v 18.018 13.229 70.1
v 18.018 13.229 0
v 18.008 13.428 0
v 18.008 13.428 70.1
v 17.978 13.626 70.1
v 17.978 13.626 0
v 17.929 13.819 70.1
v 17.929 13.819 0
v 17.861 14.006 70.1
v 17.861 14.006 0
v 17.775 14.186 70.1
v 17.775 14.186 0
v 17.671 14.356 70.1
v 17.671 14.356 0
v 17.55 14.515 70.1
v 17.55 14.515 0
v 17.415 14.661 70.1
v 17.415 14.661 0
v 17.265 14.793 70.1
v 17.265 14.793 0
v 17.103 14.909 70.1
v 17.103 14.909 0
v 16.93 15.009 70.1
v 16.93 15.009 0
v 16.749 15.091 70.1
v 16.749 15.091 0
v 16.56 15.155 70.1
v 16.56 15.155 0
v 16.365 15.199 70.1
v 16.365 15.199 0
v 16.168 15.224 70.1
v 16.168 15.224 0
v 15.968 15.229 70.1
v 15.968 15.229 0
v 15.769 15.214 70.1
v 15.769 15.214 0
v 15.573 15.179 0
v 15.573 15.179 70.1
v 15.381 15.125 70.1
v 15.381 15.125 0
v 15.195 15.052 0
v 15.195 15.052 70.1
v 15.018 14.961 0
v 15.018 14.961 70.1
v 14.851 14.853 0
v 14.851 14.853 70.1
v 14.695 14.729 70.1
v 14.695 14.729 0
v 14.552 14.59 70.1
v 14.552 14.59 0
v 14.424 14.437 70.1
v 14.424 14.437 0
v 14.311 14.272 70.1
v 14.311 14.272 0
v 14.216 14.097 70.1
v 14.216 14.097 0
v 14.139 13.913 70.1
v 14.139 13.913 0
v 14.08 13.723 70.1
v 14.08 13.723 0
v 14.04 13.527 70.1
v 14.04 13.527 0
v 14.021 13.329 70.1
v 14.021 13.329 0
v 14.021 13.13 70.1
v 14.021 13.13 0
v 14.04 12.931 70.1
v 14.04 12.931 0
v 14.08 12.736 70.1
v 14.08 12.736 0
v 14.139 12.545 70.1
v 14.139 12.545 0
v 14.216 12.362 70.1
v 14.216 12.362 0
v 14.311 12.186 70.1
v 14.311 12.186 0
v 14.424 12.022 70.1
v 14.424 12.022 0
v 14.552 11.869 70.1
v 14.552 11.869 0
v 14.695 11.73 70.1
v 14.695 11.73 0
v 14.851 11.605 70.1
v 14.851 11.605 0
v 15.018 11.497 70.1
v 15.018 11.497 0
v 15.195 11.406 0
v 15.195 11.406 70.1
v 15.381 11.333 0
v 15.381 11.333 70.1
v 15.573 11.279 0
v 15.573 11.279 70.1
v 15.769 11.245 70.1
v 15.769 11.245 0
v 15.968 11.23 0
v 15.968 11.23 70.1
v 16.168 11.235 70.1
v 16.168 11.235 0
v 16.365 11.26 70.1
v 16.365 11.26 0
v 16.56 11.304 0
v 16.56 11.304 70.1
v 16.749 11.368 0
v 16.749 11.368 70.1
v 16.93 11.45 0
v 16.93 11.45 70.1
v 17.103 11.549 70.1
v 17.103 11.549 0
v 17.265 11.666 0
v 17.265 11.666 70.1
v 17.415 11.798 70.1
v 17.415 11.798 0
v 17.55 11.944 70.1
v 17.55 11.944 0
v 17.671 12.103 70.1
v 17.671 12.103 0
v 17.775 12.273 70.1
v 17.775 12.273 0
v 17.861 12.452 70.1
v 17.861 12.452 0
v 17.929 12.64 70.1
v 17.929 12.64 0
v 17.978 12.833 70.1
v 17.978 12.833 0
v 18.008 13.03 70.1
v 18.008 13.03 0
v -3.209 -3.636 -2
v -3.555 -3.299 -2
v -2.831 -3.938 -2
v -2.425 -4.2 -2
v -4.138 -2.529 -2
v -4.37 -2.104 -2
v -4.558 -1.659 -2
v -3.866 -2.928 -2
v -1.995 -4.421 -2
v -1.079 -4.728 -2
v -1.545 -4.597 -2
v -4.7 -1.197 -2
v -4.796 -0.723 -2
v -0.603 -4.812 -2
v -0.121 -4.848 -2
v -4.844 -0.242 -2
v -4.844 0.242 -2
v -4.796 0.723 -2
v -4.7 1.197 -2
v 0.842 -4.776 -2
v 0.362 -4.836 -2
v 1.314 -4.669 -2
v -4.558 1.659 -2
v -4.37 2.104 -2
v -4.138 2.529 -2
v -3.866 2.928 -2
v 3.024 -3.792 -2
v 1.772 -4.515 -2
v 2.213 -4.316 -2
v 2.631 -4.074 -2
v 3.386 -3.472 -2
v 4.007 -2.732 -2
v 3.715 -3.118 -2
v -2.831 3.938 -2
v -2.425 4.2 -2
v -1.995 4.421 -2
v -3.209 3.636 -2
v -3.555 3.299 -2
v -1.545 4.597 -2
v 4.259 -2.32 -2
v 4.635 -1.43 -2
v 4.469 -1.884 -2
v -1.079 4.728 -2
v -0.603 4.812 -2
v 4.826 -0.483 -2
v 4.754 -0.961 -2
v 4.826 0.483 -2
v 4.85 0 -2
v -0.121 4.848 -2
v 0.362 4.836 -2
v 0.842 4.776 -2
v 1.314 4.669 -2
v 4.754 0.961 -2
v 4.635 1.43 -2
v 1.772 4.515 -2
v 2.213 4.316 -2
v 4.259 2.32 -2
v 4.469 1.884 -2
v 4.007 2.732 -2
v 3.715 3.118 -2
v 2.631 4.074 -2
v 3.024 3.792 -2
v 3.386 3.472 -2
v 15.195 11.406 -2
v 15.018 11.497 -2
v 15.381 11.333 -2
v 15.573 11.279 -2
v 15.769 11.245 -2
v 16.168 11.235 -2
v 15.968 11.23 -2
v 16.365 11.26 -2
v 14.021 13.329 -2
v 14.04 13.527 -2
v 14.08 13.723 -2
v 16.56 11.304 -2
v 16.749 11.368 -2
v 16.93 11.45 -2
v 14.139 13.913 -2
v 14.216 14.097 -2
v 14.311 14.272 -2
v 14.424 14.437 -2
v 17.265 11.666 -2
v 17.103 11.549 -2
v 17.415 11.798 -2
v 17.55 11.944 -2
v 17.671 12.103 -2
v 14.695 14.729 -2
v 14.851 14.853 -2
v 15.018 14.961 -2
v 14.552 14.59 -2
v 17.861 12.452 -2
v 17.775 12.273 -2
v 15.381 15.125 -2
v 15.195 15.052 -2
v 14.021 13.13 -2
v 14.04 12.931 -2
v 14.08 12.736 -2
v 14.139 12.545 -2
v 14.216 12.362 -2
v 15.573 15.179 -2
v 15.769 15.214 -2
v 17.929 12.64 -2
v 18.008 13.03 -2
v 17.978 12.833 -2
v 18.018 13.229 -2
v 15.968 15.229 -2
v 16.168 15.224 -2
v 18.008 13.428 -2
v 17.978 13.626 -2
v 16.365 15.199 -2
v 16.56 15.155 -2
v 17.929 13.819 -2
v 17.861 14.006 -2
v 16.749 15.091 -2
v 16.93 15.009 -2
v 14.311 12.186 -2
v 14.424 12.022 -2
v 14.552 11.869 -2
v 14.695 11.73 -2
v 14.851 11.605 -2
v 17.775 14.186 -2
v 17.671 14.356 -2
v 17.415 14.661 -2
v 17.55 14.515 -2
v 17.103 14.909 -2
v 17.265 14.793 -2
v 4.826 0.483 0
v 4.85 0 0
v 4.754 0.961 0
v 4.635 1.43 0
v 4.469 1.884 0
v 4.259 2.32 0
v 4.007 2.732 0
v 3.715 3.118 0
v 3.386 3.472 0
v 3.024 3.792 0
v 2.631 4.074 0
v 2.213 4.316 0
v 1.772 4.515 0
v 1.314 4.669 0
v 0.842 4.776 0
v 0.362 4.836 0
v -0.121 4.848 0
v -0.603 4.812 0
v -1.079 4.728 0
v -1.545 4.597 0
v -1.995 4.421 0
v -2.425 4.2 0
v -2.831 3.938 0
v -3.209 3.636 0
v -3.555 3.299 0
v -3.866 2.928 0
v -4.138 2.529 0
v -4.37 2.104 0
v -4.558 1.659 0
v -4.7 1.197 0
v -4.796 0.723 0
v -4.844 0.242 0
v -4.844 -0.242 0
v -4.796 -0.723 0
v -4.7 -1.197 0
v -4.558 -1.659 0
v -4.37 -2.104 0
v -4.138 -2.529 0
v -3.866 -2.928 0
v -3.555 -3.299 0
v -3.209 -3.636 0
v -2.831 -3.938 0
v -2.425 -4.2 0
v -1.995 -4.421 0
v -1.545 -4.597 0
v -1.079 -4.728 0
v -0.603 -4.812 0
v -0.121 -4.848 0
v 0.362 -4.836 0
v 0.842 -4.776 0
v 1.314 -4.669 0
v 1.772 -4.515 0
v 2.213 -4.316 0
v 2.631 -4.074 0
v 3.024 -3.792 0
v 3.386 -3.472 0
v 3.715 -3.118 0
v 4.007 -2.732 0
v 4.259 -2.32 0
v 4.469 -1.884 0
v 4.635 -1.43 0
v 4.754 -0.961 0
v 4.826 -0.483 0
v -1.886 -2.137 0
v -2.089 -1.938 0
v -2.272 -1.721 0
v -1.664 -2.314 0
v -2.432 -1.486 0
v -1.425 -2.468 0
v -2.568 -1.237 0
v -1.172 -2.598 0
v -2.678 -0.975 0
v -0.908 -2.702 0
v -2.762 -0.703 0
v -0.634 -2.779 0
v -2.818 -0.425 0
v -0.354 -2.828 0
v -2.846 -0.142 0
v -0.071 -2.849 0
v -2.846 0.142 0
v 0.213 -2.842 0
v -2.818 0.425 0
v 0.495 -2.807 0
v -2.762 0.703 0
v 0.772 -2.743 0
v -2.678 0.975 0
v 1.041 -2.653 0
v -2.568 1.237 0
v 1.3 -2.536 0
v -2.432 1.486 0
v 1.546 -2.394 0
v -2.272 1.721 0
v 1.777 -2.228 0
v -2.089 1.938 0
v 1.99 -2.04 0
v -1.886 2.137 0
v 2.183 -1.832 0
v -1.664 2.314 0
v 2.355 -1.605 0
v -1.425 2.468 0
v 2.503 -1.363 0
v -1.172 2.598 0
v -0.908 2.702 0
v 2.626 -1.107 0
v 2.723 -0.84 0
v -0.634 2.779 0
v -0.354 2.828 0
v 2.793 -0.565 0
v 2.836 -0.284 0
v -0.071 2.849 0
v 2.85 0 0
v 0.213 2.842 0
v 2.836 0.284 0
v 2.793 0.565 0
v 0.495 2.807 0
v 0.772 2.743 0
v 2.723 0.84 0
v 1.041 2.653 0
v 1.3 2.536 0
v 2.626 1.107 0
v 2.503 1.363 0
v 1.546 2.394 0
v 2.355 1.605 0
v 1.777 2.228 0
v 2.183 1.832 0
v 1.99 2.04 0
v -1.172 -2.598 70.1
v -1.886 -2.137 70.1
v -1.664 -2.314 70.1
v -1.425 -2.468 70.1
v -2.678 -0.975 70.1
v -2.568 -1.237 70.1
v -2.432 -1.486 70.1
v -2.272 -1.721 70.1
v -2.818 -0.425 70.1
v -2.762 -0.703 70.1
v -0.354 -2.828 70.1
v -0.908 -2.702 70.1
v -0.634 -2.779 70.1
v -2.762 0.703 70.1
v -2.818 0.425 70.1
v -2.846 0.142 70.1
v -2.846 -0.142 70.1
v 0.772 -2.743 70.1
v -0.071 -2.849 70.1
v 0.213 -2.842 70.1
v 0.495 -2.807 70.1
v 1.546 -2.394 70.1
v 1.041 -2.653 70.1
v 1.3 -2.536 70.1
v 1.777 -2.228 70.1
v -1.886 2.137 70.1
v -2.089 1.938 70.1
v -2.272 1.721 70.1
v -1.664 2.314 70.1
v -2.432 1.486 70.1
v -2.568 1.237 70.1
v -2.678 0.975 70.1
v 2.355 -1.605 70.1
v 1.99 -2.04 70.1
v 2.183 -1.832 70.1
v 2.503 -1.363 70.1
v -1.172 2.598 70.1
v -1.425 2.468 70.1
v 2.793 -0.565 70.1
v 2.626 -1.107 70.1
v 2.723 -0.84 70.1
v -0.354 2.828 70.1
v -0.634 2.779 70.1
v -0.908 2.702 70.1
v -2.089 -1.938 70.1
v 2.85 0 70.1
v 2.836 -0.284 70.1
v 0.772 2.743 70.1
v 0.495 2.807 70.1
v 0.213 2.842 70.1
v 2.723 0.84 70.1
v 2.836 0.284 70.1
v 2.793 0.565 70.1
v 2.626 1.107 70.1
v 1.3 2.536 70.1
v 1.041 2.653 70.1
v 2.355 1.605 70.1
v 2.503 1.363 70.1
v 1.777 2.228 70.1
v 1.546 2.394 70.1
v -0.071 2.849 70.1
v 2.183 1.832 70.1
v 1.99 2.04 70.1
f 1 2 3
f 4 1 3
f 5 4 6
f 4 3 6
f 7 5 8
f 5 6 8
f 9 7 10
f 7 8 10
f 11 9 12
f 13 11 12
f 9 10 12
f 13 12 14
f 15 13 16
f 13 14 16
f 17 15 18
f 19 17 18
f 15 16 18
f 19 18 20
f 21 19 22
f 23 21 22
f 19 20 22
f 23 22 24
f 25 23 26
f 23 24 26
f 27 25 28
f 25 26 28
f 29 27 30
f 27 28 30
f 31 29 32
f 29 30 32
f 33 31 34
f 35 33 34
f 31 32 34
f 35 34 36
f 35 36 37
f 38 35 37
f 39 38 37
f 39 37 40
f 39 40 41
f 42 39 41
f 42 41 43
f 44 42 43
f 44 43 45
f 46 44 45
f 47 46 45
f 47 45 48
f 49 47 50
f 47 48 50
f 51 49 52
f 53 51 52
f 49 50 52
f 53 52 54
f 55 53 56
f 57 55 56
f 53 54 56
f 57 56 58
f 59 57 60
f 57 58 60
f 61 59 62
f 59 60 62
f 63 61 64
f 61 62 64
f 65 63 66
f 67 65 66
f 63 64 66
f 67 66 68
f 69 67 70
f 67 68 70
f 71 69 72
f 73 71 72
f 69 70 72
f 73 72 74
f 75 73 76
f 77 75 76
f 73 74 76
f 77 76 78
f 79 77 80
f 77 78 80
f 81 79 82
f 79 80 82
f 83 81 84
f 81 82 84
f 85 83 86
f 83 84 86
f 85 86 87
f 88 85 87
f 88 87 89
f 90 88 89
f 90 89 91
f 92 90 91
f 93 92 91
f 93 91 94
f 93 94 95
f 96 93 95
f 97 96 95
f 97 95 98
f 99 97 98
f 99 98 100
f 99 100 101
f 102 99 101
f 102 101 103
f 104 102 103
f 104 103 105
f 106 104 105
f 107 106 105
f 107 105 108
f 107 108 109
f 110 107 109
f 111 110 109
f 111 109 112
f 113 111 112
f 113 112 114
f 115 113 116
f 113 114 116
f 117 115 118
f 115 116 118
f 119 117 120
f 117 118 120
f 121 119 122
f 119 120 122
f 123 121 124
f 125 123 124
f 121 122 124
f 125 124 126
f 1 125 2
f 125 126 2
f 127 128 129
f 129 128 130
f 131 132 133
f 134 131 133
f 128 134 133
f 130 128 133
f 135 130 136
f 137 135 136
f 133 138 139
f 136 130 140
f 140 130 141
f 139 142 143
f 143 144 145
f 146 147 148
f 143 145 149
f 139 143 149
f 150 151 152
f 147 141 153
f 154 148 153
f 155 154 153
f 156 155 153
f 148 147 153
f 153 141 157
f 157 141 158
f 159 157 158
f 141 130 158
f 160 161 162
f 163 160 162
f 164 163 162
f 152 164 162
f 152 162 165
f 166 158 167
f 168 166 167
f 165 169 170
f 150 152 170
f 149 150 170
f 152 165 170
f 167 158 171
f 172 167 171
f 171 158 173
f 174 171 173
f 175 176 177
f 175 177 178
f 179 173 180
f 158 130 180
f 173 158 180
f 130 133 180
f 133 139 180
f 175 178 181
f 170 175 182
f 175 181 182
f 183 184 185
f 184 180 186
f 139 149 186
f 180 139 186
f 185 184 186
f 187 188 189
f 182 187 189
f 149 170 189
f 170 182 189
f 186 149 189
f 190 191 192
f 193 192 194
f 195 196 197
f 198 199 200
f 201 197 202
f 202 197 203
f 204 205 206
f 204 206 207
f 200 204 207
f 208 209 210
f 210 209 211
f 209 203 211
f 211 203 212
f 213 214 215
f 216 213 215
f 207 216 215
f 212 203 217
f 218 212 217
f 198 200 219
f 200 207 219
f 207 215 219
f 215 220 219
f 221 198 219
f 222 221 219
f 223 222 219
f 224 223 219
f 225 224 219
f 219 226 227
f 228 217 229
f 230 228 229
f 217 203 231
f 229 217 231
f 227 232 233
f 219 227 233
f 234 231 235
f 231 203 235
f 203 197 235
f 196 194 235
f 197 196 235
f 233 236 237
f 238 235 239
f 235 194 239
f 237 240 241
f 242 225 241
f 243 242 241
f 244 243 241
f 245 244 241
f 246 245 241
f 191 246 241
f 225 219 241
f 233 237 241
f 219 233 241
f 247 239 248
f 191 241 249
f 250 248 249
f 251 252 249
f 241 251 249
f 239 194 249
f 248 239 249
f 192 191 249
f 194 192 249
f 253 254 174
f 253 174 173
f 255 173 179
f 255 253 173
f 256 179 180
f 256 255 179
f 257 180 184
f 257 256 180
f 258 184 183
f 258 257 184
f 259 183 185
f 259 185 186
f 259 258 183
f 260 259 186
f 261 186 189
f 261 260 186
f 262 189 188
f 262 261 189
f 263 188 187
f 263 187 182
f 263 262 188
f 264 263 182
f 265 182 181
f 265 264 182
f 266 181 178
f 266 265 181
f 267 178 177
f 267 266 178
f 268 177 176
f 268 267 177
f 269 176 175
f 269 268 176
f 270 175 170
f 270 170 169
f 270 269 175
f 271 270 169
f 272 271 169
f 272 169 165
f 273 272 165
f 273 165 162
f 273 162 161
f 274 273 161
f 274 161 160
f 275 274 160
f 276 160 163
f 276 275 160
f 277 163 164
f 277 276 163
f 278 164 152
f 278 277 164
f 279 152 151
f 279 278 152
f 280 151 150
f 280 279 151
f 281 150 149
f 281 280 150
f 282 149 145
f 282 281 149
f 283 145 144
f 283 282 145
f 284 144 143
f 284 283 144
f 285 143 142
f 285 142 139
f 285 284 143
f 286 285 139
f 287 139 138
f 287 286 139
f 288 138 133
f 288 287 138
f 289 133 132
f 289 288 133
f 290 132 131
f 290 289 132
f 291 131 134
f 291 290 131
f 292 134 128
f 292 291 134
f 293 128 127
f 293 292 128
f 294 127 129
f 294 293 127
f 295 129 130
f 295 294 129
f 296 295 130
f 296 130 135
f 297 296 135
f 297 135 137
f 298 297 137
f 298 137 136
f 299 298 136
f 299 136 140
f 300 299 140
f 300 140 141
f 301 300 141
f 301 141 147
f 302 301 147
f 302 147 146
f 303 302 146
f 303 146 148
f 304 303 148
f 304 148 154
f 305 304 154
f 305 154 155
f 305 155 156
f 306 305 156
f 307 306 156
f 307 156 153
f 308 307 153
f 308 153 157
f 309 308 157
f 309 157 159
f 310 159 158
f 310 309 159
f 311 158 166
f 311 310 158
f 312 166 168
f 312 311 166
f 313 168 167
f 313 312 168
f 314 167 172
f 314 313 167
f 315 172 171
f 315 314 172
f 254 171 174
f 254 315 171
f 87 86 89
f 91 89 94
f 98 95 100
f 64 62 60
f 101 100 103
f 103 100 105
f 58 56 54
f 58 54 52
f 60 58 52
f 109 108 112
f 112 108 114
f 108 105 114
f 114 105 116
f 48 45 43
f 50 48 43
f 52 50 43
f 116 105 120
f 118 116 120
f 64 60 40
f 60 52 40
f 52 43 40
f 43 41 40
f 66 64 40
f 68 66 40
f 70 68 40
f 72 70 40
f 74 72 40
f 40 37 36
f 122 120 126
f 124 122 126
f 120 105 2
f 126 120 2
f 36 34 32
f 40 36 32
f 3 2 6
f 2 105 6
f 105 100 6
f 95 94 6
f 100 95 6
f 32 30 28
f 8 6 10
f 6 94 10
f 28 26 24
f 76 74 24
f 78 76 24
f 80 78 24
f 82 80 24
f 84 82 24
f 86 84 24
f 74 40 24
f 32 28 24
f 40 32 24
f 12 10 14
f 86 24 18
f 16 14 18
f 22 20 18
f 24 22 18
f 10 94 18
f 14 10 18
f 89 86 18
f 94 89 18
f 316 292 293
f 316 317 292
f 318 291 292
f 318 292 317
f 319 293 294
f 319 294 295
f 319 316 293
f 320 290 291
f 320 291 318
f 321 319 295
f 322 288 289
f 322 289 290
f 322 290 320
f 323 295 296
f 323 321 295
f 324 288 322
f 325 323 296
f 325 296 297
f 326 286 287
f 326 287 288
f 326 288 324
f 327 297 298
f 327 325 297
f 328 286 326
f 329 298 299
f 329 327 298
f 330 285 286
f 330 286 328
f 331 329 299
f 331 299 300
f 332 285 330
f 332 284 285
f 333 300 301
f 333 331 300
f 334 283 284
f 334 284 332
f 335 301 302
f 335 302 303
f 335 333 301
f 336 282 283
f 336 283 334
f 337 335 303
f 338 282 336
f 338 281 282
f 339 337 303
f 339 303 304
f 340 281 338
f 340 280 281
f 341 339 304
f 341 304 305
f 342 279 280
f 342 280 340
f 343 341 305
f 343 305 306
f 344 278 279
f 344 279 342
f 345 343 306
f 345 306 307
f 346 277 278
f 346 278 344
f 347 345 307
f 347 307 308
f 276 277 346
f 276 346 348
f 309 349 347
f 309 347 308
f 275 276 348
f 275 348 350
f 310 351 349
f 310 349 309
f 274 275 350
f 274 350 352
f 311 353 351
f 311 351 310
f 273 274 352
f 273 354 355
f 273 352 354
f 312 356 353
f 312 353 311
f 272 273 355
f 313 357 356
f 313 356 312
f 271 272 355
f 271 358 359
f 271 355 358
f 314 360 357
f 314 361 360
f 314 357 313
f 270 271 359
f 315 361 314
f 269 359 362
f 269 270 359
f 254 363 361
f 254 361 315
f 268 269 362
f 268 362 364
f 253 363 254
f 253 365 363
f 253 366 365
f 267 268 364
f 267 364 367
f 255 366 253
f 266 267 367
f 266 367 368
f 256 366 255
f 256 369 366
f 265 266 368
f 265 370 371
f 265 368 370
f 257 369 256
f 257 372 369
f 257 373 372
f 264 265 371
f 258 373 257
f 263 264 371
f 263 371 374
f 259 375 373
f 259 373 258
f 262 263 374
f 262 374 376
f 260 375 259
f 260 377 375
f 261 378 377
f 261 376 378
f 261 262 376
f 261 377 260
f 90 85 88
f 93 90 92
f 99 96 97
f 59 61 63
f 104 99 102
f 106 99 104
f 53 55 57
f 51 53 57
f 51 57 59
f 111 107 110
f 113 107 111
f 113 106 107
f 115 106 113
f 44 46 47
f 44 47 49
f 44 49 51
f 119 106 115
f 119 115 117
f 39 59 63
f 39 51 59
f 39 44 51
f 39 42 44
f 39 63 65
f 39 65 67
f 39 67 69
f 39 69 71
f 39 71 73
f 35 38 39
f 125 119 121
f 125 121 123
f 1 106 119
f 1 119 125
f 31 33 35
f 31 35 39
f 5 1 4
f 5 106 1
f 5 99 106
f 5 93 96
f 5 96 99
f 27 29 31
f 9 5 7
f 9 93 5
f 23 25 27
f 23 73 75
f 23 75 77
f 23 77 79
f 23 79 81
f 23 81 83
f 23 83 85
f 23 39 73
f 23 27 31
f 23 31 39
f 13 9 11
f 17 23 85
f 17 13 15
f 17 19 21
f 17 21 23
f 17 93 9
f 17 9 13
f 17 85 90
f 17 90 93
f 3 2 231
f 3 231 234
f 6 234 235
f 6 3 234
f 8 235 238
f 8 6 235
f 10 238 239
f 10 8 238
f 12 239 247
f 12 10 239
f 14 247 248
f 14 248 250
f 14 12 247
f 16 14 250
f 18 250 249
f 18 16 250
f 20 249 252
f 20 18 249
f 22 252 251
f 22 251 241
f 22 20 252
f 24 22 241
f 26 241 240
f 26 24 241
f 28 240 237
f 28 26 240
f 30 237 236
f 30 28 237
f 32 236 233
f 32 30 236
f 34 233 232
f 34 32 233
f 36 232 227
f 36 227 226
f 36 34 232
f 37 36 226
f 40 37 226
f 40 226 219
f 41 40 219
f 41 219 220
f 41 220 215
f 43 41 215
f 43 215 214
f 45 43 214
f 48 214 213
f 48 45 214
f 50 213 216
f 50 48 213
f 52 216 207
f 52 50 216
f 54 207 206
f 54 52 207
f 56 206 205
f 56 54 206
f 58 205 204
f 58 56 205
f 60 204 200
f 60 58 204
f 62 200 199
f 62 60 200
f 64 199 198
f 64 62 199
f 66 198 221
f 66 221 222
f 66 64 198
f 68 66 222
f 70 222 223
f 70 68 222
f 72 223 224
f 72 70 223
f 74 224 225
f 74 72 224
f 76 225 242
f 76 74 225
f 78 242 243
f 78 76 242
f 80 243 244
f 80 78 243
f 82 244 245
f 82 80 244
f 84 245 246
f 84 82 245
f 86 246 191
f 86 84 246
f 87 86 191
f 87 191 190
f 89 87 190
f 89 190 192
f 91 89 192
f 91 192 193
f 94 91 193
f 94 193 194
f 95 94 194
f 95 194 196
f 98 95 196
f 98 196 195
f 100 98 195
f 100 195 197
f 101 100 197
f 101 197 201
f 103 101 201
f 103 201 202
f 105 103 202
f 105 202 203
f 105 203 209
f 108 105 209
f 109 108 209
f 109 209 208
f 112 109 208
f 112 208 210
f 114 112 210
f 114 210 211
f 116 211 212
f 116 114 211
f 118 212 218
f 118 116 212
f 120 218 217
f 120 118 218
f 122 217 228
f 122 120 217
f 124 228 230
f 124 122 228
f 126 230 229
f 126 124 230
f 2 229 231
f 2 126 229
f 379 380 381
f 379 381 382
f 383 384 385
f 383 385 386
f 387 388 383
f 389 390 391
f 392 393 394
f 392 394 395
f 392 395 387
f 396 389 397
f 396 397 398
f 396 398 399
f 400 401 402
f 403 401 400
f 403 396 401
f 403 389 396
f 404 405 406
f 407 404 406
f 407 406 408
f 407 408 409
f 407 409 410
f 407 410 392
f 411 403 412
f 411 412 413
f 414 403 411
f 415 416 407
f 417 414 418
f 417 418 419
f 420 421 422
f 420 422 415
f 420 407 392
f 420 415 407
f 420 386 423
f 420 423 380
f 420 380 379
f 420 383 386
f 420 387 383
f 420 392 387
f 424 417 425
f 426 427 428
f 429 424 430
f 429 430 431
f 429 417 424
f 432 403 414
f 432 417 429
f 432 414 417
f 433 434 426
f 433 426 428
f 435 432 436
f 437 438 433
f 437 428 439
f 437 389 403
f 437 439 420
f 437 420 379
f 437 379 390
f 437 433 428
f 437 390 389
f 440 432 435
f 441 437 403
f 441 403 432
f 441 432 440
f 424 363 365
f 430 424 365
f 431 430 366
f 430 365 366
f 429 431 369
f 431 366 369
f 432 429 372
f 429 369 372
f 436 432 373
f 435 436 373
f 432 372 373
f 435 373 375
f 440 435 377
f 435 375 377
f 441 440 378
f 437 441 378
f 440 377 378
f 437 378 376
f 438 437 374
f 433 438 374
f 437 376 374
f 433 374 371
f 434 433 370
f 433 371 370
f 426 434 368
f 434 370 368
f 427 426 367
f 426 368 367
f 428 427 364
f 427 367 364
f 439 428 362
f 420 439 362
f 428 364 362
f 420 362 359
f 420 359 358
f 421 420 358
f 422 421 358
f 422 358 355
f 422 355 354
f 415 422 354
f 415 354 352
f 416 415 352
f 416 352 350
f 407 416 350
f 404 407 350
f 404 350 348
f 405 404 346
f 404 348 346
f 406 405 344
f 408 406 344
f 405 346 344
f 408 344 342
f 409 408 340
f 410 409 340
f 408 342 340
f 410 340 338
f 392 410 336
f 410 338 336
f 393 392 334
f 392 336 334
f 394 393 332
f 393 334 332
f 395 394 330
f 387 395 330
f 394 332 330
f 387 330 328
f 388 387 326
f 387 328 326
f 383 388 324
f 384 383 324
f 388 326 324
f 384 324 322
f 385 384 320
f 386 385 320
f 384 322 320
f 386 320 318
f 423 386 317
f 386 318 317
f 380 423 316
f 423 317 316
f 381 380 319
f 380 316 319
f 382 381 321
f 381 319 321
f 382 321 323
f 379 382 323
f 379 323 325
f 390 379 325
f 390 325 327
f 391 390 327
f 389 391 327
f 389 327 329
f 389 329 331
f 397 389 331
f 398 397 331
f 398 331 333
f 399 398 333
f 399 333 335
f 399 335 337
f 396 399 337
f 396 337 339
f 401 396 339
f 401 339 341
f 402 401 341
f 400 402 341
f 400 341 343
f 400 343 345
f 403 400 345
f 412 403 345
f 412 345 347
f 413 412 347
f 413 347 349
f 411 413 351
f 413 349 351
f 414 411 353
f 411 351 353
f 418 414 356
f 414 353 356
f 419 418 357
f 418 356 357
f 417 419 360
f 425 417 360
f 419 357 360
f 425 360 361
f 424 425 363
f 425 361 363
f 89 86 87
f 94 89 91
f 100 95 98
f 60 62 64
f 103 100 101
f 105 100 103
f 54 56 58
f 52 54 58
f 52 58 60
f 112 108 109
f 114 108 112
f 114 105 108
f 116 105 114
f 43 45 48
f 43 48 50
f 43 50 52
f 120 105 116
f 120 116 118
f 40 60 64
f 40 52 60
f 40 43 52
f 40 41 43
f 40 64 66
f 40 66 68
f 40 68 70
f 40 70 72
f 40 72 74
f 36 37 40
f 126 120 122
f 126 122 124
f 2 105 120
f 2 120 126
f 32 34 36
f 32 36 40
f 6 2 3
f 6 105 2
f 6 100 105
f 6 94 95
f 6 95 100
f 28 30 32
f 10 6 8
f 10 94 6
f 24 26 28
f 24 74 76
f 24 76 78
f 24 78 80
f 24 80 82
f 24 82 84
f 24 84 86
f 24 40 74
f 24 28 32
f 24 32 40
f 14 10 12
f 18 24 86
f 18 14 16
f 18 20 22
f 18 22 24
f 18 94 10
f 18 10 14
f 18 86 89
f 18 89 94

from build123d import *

# Parameters (mm, degrees)
F0_R      = 2.85
F1_DEPTH  = 70.1
F0_R_2    = 2
F0_R_3    = 4.85
F1_FACE_R = 2.85
F2_DEPTH  = 2


with BuildPart() as f1:
    # F0 (on Top) → F1 (new body)
    with BuildSketch(Plane.XY):
        Circle(F0_R)
    extrude(amount=F1_DEPTH)

    # F0 (on Top) + F1_face (on face) → F2 (join)
    with BuildSketch(Plane.XY):
        Circle(F0_R_3)
        Circle(F0_R, mode=Mode.SUBTRACT)
        with Locations((16.0180740058, 13.2293421775)):
            Circle(F0_R_2)
    with BuildSketch(Plane(origin=(0, 0, 0), x_dir=(1, 0, 0), z_dir=(0, 0, -1))):
        Circle(F1_FACE_R)
    extrude(amount=-F2_DEPTH, dir=(0, 0, 1))


with BuildPart() as f1b:
    # F0 (on Top) → F1, piece 2 (new body)
    with BuildSketch(Plane.XY):
        with Locations((16.0180740058, 13.2293421775)):
            Circle(F0_R_2)
    extrude(amount=F1_DEPTH)


solid = Compound([f1.part, f1b.part])
